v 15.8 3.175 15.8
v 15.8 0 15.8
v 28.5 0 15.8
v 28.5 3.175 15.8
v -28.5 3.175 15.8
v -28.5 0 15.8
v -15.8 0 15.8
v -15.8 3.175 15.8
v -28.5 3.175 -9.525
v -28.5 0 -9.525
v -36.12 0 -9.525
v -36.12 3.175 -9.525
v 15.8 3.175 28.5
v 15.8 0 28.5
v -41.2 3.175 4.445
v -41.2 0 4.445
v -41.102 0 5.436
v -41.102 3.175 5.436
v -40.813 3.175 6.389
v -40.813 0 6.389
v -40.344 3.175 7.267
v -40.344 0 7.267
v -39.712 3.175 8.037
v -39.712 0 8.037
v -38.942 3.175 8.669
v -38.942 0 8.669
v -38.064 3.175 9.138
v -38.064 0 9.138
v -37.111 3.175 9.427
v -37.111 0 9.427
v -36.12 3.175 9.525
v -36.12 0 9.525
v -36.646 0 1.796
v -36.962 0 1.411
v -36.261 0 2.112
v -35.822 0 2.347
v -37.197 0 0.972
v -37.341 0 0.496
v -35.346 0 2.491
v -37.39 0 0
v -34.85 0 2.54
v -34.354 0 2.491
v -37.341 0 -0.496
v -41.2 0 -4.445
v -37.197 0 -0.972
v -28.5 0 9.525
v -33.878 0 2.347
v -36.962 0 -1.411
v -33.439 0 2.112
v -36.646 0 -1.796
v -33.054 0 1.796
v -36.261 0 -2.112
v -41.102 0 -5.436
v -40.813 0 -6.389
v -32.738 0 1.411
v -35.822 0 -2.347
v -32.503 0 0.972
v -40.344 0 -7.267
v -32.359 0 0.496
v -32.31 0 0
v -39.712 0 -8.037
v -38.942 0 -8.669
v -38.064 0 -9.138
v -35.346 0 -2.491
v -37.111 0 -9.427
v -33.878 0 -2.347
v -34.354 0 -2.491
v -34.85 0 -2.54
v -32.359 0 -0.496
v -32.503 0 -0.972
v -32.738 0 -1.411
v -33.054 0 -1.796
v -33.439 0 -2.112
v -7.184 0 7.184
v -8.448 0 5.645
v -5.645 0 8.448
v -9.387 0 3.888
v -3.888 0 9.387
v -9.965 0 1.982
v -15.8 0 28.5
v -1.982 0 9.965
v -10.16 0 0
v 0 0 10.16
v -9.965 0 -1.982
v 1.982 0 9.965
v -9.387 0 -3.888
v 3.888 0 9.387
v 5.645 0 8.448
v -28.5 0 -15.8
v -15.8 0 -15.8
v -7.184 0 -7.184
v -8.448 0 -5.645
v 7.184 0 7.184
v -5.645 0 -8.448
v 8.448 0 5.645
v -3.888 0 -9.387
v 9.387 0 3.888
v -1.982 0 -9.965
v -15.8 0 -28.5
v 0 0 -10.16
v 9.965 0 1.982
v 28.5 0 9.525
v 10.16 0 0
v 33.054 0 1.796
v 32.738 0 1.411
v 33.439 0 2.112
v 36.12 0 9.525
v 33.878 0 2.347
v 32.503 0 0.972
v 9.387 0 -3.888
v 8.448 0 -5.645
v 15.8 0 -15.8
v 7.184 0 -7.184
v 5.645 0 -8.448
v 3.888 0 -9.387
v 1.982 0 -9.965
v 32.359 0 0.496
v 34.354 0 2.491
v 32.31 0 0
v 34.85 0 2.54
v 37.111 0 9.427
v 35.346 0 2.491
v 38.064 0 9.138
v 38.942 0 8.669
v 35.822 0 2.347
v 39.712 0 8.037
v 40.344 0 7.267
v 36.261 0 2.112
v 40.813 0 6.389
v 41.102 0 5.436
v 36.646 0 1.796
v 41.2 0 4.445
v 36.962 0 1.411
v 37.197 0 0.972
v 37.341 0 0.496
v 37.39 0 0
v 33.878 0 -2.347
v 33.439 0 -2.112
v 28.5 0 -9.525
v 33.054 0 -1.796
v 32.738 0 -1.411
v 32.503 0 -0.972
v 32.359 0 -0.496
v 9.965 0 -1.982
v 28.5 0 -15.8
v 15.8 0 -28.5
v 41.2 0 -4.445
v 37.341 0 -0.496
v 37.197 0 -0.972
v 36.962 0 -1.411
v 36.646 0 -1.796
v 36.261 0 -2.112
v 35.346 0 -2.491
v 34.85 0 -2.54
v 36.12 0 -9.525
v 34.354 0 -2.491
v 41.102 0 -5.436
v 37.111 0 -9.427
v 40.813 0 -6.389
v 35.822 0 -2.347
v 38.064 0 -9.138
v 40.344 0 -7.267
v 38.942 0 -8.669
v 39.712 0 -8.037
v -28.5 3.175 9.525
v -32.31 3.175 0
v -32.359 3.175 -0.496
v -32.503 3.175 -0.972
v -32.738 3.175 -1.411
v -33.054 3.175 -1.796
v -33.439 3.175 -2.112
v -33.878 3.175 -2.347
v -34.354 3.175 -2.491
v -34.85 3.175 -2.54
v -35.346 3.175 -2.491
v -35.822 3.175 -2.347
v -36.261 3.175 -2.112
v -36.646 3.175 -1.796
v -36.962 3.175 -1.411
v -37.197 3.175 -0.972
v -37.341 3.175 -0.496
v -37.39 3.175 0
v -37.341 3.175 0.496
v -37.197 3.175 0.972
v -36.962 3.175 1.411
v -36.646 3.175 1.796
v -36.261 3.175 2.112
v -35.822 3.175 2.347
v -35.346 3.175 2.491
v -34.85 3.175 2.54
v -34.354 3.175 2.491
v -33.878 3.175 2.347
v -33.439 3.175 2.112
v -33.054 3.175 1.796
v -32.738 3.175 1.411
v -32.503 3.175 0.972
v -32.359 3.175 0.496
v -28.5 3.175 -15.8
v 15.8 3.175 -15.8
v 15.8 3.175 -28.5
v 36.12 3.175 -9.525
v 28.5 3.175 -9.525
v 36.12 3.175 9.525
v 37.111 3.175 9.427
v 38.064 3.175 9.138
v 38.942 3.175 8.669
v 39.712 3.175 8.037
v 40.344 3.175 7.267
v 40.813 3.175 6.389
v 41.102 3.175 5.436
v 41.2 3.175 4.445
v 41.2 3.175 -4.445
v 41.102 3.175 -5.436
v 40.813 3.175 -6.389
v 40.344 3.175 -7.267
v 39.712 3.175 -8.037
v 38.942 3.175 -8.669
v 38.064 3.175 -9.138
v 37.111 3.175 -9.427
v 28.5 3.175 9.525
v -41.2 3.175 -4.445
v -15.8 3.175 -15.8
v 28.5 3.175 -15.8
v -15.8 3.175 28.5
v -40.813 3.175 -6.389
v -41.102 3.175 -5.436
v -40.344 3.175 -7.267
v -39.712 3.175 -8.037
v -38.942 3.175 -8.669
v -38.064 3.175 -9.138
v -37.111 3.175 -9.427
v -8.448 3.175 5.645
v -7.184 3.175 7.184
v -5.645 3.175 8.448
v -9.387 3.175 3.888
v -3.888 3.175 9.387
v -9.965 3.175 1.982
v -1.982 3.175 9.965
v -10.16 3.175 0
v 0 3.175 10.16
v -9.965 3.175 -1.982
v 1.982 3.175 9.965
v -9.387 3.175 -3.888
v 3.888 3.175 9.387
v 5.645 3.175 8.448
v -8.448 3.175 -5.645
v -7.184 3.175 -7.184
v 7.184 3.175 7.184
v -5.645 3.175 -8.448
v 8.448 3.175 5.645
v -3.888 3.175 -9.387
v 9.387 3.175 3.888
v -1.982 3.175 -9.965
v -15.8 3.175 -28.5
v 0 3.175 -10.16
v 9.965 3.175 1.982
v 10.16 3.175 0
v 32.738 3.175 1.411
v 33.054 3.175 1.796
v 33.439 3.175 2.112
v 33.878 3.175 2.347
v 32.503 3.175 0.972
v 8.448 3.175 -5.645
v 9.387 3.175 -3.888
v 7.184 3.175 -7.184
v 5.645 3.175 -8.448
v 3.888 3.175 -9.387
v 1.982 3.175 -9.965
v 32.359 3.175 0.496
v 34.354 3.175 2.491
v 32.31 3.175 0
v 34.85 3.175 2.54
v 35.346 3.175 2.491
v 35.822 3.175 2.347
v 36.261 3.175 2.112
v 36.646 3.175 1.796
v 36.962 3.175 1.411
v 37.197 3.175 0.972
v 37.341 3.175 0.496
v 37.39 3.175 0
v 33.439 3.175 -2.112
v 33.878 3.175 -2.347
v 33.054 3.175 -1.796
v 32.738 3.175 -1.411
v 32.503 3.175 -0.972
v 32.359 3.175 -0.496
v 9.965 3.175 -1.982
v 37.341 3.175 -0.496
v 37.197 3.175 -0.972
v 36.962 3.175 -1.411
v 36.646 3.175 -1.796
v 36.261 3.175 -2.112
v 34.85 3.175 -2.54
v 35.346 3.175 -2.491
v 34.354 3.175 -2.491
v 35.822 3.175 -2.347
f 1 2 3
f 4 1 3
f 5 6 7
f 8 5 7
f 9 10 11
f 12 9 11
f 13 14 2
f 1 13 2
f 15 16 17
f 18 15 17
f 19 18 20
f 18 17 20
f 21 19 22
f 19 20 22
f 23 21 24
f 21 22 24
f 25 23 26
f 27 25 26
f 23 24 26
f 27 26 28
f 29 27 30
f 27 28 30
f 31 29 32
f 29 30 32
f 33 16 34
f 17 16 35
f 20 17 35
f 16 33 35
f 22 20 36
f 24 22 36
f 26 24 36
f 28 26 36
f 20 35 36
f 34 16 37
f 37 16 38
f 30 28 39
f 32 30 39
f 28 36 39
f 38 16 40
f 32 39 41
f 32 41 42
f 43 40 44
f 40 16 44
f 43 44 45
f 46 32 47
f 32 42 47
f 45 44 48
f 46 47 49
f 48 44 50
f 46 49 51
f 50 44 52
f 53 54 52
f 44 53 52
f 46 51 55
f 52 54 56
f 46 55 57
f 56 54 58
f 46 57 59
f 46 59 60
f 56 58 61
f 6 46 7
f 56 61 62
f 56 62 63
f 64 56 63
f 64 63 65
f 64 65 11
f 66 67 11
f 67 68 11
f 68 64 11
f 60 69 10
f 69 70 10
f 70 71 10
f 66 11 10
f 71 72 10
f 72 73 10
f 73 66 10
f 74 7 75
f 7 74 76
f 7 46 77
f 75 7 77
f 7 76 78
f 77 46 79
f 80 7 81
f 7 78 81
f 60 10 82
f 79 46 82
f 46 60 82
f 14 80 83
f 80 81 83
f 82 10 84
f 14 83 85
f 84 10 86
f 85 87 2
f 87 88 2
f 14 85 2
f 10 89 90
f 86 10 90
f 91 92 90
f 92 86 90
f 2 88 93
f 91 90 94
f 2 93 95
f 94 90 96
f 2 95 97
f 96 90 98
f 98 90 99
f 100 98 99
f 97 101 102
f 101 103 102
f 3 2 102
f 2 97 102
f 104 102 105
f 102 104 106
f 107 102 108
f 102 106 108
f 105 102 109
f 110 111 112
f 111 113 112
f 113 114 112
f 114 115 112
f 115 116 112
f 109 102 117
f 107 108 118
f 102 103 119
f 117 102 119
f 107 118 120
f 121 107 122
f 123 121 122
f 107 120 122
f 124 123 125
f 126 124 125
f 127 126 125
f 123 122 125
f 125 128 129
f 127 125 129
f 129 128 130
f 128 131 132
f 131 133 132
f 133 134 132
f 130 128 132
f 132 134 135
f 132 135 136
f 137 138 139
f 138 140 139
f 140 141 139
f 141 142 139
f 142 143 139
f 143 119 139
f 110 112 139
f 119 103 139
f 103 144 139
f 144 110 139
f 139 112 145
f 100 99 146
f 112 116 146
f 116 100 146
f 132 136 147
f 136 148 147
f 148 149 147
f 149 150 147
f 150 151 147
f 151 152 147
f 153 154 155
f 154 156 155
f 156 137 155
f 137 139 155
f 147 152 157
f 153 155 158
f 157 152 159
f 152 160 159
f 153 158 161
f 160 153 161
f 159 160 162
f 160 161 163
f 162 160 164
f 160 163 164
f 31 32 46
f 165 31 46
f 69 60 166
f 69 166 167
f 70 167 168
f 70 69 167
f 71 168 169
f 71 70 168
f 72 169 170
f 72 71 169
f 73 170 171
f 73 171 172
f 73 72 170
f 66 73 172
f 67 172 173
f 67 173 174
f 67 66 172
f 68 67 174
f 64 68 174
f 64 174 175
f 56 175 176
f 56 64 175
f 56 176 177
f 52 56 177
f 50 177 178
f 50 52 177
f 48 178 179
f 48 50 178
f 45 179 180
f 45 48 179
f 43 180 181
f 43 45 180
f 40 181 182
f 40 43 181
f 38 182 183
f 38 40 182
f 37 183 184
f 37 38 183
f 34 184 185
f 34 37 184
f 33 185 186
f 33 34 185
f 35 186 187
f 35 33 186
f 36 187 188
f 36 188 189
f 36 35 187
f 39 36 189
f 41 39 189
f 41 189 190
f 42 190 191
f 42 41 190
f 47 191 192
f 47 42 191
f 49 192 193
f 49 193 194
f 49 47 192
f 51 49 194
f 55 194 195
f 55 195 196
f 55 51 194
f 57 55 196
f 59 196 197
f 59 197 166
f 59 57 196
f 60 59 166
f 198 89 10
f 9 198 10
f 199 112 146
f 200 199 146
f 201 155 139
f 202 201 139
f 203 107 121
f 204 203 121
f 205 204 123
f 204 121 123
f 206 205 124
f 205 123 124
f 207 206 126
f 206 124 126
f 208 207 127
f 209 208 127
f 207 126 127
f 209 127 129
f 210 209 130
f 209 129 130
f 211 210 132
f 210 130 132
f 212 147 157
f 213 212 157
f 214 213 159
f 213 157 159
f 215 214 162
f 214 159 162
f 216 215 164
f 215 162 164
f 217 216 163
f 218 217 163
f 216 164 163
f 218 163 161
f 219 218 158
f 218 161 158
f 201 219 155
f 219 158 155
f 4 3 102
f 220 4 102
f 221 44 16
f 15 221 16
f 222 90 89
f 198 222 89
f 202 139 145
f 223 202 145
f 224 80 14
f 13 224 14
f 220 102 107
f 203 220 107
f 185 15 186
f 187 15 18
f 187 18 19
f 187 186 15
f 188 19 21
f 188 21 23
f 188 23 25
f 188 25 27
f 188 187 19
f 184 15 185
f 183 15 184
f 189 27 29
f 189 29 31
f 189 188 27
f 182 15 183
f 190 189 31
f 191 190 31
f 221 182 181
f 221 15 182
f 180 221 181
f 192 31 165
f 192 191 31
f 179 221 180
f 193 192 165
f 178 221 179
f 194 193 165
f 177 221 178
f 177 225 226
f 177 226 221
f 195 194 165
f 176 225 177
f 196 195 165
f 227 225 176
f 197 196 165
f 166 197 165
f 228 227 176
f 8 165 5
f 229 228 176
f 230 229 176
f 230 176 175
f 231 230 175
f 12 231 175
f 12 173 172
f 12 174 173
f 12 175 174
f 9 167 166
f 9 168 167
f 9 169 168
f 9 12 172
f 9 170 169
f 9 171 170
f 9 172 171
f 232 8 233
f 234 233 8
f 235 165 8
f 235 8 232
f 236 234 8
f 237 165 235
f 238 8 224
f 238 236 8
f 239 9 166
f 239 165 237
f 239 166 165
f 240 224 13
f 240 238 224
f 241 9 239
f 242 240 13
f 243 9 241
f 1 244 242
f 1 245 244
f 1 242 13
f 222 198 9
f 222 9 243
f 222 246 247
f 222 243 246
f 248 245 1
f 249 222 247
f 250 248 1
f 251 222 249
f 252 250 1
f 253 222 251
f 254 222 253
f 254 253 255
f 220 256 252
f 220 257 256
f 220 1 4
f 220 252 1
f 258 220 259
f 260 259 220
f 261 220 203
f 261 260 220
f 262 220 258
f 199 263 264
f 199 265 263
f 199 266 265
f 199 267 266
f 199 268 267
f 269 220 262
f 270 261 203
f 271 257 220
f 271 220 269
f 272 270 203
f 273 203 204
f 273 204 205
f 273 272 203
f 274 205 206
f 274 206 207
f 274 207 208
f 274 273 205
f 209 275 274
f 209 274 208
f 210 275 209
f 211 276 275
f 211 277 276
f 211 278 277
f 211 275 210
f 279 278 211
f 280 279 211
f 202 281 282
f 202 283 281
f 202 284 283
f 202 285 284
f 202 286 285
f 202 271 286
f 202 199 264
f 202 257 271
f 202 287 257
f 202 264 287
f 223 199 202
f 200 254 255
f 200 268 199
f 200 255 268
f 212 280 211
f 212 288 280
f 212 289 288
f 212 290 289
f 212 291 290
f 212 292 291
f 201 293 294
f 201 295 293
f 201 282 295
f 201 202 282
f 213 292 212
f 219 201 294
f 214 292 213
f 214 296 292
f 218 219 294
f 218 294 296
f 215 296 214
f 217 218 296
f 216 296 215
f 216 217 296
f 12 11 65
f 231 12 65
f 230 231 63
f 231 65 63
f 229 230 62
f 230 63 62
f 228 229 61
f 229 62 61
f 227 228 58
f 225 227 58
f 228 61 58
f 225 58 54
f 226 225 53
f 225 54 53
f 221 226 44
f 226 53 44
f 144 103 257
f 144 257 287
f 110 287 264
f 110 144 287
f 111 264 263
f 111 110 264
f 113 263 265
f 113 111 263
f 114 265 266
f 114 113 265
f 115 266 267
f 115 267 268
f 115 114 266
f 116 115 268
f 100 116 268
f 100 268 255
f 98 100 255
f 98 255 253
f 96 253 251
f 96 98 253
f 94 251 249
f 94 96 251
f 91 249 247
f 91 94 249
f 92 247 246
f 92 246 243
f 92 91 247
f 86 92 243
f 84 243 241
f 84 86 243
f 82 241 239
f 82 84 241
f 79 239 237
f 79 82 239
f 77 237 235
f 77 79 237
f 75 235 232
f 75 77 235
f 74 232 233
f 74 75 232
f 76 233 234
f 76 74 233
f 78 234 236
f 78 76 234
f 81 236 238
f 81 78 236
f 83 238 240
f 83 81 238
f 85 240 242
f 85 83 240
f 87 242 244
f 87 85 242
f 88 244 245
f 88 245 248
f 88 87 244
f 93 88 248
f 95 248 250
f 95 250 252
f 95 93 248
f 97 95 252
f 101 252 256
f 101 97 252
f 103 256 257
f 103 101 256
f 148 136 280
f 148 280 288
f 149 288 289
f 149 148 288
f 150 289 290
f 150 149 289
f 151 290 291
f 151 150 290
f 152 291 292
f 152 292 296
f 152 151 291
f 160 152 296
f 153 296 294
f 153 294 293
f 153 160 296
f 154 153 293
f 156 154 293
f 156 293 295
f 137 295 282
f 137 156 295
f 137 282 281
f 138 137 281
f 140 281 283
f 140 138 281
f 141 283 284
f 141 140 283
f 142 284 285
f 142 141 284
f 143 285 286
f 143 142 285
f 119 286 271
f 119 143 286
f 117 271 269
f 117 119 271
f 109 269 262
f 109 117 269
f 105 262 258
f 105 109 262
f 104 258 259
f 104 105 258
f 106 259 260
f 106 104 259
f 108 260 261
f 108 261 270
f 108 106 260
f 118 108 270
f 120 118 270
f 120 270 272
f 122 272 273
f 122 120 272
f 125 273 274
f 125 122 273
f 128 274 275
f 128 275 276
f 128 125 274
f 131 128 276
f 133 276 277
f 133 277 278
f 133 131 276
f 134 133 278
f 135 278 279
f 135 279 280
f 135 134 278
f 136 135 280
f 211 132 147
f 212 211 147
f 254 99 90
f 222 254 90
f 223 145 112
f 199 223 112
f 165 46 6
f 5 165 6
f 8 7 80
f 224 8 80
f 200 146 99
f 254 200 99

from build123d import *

# Parameters (mm, degrees)
SKETCH1_R           = 10.16
SKETCH1_R_2         = 2.54
BOSS_EXTRUDE1_DEPTH = 3.175


with BuildPart() as part:
    # Sketch1 → Boss-Extrude1 (new body)
    with BuildSketch(Plane(origin=(0, 0, 0), x_dir=(1, 0, 0), z_dir=(0, 1, 0))):
        with BuildLine():
            Line((-28.4999938, 15.7999938), (-28.4999938, 9.525))
            Line((-28.4999938, 9.525), (-36.1199938, 9.525))
            ThreePointArc((-36.1199938, 9.525), (-39.712096248, 8.037102448), (-41.1999938, 4.445))
            Line((-41.1999938, 4.445), (-41.1999938, -4.445))
            ThreePointArc((-41.1999938, -4.445), (-39.712096248, -8.037102448), (-36.1199938, -9.525))
            Line((-36.1199938, -9.525), (-28.4999938, -9.525))
            Line((-28.4999938, -9.525), (-28.4999938, -15.7999938))
            Line((-28.4999938, -15.7999938), (-15.7999938, -15.7999938))
            Line((-15.7999938, -15.7999938), (-15.7999938, -28.4999938))
            Line((-15.7999938, -28.4999938), (15.7999938, -28.4999938))
            Line((15.7999938, -28.4999938), (15.7999938, -15.7999938))
            Line((15.7999938, -15.7999938), (28.4999938, -15.7999938))
            Line((28.4999938, -15.7999938), (28.4999938, -9.525))
            Line((28.4999938, -9.525), (36.1199938, -9.525))
            ThreePointArc((36.1199938, -9.525), (39.712096248, -8.037102448), (41.1999938, -4.445))
            Line((41.1999938, -4.445), (41.1999938, 4.445))
            ThreePointArc((41.1999938, 4.445), (39.712096248, 8.037102448), (36.1199938, 9.525))
            Line((36.1199938, 9.525), (28.4999938, 9.525))
            Line((28.4999938, 9.525), (28.4999938, 15.7999938))
            Line((28.4999938, 15.7999938), (15.7999938, 15.7999938))
            Line((15.7999938, 15.7999938), (15.7999938, 28.4999938))
            Line((15.7999938, 28.4999938), (-15.7999938, 28.4999938))
            Line((-15.7999938, 28.4999938), (-15.7999938, 15.7999938))
            Line((-15.7999938, 15.7999938), (-28.4999938, 15.7999938))
        make_face()
        Circle(SKETCH1_R, mode=Mode.SUBTRACT)
        with Locations((-34.8499938, 0)):
            Circle(SKETCH1_R_2, mode=Mode.SUBTRACT)
        with Locations((34.8499938, 0)):
            Circle(SKETCH1_R_2, mode=Mode.SUBTRACT)
    extrude(amount=BOSS_EXTRUDE1_DEPTH)


solid = part.part
